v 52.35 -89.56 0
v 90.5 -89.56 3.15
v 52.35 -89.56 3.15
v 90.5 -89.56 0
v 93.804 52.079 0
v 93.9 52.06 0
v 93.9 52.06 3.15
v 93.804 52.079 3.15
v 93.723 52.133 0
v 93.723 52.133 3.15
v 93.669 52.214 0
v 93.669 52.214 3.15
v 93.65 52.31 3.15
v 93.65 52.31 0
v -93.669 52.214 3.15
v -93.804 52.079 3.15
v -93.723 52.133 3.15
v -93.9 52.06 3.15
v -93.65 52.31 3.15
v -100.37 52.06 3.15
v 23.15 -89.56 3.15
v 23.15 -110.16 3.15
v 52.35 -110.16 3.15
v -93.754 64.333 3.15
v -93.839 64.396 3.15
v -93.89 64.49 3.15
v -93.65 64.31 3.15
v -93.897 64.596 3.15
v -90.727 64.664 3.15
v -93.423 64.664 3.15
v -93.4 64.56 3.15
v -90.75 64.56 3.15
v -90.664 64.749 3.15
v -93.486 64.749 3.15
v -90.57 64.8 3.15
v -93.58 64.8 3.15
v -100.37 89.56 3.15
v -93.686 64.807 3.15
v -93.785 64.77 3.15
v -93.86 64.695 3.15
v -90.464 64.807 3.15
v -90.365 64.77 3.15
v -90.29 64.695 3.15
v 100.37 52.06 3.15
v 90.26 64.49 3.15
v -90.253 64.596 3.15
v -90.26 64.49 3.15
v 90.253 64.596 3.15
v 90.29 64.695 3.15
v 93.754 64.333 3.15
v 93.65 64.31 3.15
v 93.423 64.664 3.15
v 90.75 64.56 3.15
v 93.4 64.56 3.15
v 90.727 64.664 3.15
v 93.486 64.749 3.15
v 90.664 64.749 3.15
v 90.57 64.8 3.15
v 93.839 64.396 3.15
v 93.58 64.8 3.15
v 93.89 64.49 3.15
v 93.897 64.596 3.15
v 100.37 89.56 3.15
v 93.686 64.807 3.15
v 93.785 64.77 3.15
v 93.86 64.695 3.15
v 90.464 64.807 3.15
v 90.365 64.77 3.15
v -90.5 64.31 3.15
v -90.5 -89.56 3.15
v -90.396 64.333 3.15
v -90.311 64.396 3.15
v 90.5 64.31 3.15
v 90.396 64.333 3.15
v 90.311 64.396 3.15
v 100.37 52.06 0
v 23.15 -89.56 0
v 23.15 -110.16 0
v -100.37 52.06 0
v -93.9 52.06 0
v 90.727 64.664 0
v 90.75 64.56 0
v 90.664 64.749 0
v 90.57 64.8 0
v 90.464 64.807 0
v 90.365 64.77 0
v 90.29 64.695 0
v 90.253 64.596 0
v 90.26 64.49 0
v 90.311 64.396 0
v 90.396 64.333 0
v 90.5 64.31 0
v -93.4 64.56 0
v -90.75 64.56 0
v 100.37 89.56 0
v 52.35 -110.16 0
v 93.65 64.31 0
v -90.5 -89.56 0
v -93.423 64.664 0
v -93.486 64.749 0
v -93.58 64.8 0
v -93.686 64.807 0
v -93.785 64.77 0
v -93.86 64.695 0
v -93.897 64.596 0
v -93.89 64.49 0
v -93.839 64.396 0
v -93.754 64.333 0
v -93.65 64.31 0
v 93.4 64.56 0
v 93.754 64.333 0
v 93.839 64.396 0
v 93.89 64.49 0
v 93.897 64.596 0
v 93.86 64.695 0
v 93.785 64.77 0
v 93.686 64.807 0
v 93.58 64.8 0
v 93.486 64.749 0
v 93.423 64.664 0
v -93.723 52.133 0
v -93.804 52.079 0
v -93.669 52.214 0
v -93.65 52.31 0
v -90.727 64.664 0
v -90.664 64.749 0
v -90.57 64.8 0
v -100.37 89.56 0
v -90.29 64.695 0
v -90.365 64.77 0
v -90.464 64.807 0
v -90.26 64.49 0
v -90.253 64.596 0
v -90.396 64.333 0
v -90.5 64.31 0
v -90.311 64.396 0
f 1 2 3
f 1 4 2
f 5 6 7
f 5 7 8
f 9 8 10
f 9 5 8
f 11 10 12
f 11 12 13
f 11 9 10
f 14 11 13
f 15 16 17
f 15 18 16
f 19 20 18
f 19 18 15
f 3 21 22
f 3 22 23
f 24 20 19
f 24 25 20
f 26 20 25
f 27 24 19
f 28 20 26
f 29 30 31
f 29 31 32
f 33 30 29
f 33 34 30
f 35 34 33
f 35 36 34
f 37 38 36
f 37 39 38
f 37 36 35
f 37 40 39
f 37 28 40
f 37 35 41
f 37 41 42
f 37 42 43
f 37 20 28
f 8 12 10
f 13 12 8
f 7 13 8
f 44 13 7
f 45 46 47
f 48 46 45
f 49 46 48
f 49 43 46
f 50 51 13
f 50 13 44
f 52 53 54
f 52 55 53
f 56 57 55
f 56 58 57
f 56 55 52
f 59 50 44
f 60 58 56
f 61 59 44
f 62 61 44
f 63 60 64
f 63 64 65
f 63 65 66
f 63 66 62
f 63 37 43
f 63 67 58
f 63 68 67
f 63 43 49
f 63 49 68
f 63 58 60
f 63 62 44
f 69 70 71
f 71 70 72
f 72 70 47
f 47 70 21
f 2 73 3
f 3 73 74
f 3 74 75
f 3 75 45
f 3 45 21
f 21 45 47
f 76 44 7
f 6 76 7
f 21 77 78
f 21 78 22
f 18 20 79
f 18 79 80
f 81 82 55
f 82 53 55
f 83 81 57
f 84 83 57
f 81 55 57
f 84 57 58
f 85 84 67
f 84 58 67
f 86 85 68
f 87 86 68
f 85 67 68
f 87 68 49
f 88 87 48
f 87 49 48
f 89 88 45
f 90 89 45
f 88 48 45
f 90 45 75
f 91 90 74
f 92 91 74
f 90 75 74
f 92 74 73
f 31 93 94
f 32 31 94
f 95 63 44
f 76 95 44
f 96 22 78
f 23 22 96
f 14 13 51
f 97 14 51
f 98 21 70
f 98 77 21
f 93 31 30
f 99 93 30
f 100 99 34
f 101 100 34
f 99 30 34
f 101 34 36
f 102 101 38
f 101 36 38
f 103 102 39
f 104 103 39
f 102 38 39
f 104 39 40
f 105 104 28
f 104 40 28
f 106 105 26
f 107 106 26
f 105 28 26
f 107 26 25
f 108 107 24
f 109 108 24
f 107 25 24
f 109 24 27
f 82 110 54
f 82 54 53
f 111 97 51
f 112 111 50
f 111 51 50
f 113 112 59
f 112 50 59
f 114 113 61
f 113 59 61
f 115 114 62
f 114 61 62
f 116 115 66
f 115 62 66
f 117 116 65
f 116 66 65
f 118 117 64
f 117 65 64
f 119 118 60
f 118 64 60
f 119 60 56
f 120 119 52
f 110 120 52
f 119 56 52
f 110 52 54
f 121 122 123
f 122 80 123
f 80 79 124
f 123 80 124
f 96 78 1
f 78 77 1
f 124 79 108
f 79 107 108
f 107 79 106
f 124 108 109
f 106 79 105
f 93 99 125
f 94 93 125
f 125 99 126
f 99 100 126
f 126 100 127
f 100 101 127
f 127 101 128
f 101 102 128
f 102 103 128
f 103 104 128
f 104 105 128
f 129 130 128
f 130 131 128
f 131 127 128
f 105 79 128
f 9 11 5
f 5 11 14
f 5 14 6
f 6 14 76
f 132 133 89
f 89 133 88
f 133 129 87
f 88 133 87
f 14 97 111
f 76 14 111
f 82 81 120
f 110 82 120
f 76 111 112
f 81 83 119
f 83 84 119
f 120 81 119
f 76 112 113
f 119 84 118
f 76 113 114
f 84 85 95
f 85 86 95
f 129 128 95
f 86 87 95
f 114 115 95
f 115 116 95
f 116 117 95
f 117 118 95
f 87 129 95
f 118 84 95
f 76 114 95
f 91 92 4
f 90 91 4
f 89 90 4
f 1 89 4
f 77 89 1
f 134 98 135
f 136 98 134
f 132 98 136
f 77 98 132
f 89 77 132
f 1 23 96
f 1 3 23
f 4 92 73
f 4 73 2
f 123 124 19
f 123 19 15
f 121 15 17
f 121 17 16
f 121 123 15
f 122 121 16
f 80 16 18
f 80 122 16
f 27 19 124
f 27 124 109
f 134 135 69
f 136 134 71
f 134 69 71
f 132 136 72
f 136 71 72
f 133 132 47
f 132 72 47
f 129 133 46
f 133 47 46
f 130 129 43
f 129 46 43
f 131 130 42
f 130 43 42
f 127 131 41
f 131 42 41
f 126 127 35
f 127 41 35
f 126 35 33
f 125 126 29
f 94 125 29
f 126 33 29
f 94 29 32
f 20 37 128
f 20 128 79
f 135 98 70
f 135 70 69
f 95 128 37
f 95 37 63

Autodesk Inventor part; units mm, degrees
ref_plane "YZ Plane" through (0, 0, 0) normal (1, 0, 0) x (0, 1, 0)
ref_plane "XZ Plane" through (0, 0, 0) normal (0, 1, 0) x (-1, 0, 0)
ref_plane "XY Plane" through (0, 0, 0) normal (0, 0, 1) x (1, 0, 0)
sketch "Sketch1" plane through (0, 0, 0) normal (0, 0, 1) x (1, 0, 0)
  line L0 (90.5, -89.56) -> (-90.5, -89.56)
  line L1 (-90.5, -89.56) -> (-90.5, 89.56)
  line L2 (-90.5, 89.56) -> (90.5, 89.56)
  line L3 (90.5, 89.56) -> (90.5, -89.56)
  line L4 (90.5, -89.56) -> (-90.5, 89.56) construction
  line L5 (-90.5, -89.56) -> (90.5, 89.56) construction
  line L6 (90.5, 89.56) -> (93.65, 89.56)
  line L7 (93.65, 89.56) -> (93.65, 64.56)
  line L8 (93.65, 64.56) -> (90.5, 64.56)
  line L9 (90.5, 64.56) -> (90.5, 89.56)
  line L10 (0, 0) -> (0, 89.56)
  line L11 (-90.5, 89.56) -> (-93.65, 89.56)
  line L12 (-93.65, 89.56) -> (-93.65, 64.56)
  line L13 (-93.65, 64.56) -> (-90.5, 64.56)
  line L14 (-90.5, 64.56) -> (-90.5, 89.56)
  dimension "d0" = 179.12
  dimension "d1" = 181
  dimension "d2" = 3.15
  dimension "d3" = 25
extrude "Extrusion1" add sketch "Sketch1" along normal blind 3.15
sketch "Sketch2" plane through (0, 0, 3.15) normal (0, 0, 1) x (1, 0, 0)
  line L0 (93.65, 89.56) -> (-93.65, 89.56) projected
  line L1 (-93.65, 89.56) -> (-100.37, 89.56)
  line L2 (-100.37, 89.56) -> (-100.37, 52.06)
  line L3 (-100.37, 52.06) -> (-93.65, 52.06)
  line L4 (-93.65, 52.06) -> (-93.65, 89.56)
  line L5 (0, 89.56) -> (0, 0)
  line L6 (93.65, 89.56) -> (93.65, 64.56)
  line L7 (93.65, 89.56) -> (100.37, 89.56)
  line L8 (100.37, 89.56) -> (100.37, 52.06)
  line L9 (100.37, 52.06) -> (93.65, 52.06)
  line L10 (93.65, 52.06) -> (93.65, 89.56)
  point P0 (-93.65, 64.56)
  dimension "d6" = 6.72
  dimension "d7" = 12.5
extrude "Extrusion2" add sketch "Sketch2" against normal blind 3.15
sketch "Sketch5" plane through (0, 0, 3.15) normal (0, 0, 1) x (1, 0, 0)
  line L0 (-93.65, 64.56) -> (-90.5, 64.56) projected
  circle A0 centre (-93.65, 64.56) radius 0.25
  circle A1 centre (-90.5, 64.56) radius 0.25
  line L1 (0, 0) -> (0, 89.56)
  line L2 (100.37, 89.56) -> (-100.37, 89.56) projected
  circle A2 centre (93.65, 64.56) radius 0.25
  circle A3 centre (90.5, 64.56) radius 0.25
  dimension "d19" = 0.5
  dimension "d20" = 0.5
extrude "Extrusion5" cut sketch "Sketch5" against normal up to next
fillet "Fillet1" radius 0.25 2 edges at (-93.65, 52.06, 1.575) (93.65, 52.06, 1.575)
sketch "Sketch3" plane through (-90.5, -89.56, 0) normal (0, -1, 0) x (1, 0, 0)
  line L0 (0, 0) -> (181, 0) projected
  line L1 (0, 3.15) -> (181, 3.15) projected
  line L2 (113.65, 3.15) -> (142.85, 3.15)
  line L3 (142.85, 3.15) -> (142.85, 0)
  line L4 (142.85, 0) -> (113.65, 0)
  line L5 (113.65, 0) -> (113.65, 3.15)
  line L6 (128.25, 3.15) -> (128.25, 0)
  point P0 (90.5, 0)
  dimension "d10" = 29.2
  dimension "d11" = 37.75
extrude "Extrusion3" add sketch "Sketch3" along normal blind 20.6
sketch "Sketch4" plane through (0, 0, 3.15) normal (0, 0, 1) x (1, 0, 0)
  line L0 (-90.5, -89.56) -> (23.15, -89.56) projected
  line L1 (52.35, -110.16) -> (23.15, -110.16) projected
  circle A0 centre (47.75, -105.16) radius 1.575
  line L2 (0, 0) -> (0, -89.56)
  dimension "d14" = 5
  dimension "d15" = 47.75
  dimension "d16" = 3.15
extrude "Extrusion4" [suppressed]
equation "\"d2\" = t_window"
equation "\"t_door\" = t_window"
equation "\"d8\" = t_door"
equation "\"d11\" = protection_slot_offset"
equation "\"d12\" = protection_slot_length"
equation "\"d16\" = m3_diameter"
equation "\"wood_thickness\" = 6.72"
equation "\"m3_diameter\" = 3.15"
equation "\"m5_diameter\" = 5.25"
equation "\"stepper_screw_space\" = 35"
equation "\"stepper_shaft_diameter\" = 5"
equation "\"stepper_body_diameter\" = 28"
equation "\"laser_body_diameter\" = 12"
equation "\"thick_acrylic\" = 5.88"
equation "\"carrier_y\" = 181"
equation "\"carrier_z\" = 233.04"
equation "\"carrier_z2\" = 283.04"
equation "\"window_z\" = 185"
equation "\"window_slot\" = 25"
equation "\"reservoir_x\" = 151"
equation "\"reservoir_y\" = 151"
equation "\"thin_acrylic\" = 3.15"
equation "\"linear_bearing_spacing\" = 207"
equation "\"linear_bearing_z\" = 304.8"
equation "\"threaded_rod_z\" = 203.2"
equation "\"motor_spacing\" = 287"
equation "\"tray_boarder\" = 15"
equation "\"tray_x\" = 151"
equation "\"tray_y\" = 181"
equation "\"brass_insert_drill\" = 4"
equation "\"brass_keep_out\" = 8"
equation "\"tape_keep_out\" = 2"
equation "\"tape_thickness\" = 2"
equation "\"crane_x\" = 244.56"
equation "\"z_min_from_center\" = 72.28"
equation "\"printer_z\" = 289"
equation "\"frame_tilt\" = 0"
equation "\"lcd_x\" = 72"
equation "\"lcd_y\" = 25"
equation "\"clear_acrylic\" = 3.15"
equation "\"laser_y\" = 33"
equation "\"laser_y_offset\" = 19.4"
equation "\"laser_diameter\" = 12"
equation "\"laser_z\" = 33"
equation "\"subframe_y_offset\" = 27.5"
equation "\"frame_top_z\" = 295"
equation "\"frame_y\" = 68.44"
equation "\"frame_bottom_z\" = 225"
equation "\"t_frame\" = 6.72"
equation "\"frame_border\" = 39.5"
equation "\"t_carrier\" = 6.72"
equation "\"t_tray\" = 3.15"
equation "\"tray_border\" = 15"
equation "\"t_wall\" = 5.88"
equation "\"galvo_frame_z\" = 65"
equation "\"galvo_frame_x\" = 66"
equation "\"t_galvo_frame\" = 6.72"
equation "\"galvo_frame_y_offset\" = 27.5"
equation "\"m4_diameter\" = 4.2"
equation "\"window_y\" = 49.56"
equation "\"t_window\" = 3.15"
equation "\"laser_x\" = 62"
equation "\"drawer_z\" = 206.72"
equation "\"drawer_x\" = 181"
equation "\"drawer_y\" = 49.56"
equation "\"frame_foot_z\" = 49.5"
equation "\"drawer_z_from_bottom\" = 25"
equation "\"end_stop_offset_x\" = 83"
equation "\"t_crane\" = 6.72"
equation "\"end_stop_spacing\" = 19"
equation "\"thumb_nut_offset_y\" = 11.72"
equation "\"thumb_nut_diameter\" = 7"
equation "\"frame_foot_extension\" = 6"
equation "\"m5_brass_insert_drill\" = 6.7"
equation "\"m3_brass_insert_drill\" = 4"
equation "\"door_sensor\" = 35"
equation "\"protection_slot_offset\" = 37.75"
equation "\"protection_slot\" = 30.2"
equation "\"protection_slot_length\" = 20.6"
equation "\"m3_main_nut_width\" = 5.7"
equation "\"m3_main_extra\" = 1"
equation "\"m3_main_length\" = 14"
equation "\"m3_main_nut_thickness\" = 2.5"
equation "\"al1_thickness\" = 1.5875"
equation "\"bed_t\" = 1.5875"
equation "\"bed_fold_x\" = 15"
equation "\"bed_gap\" = 0.3"
equation "\"bed_y2\" = 45.96"
equation "\"m5_press_nut_drill\" = 6.35"
equation "\"asym_key\" = 0"
equation "\"small_round\" = 2"
equation "\"drawer_foot_mount\" = 18"
equation "\"inner_tray_x\" = 145"
equation "\"t_tape\" = 3"
equation "\"inner_tray_radius\" = 24"
equation "\"t_inner_tray\" = 5.88"
equation "\"inner_tray_border\" = 5"
equation "\"inner_tray_y\" = 145"
equation "\"bottom_clear_border\" = 5"
equation "\"t_bottom_clear\" = 3.15"
equation "\"laser_screw_spacing_y\" = 16"
properties part number "door"
